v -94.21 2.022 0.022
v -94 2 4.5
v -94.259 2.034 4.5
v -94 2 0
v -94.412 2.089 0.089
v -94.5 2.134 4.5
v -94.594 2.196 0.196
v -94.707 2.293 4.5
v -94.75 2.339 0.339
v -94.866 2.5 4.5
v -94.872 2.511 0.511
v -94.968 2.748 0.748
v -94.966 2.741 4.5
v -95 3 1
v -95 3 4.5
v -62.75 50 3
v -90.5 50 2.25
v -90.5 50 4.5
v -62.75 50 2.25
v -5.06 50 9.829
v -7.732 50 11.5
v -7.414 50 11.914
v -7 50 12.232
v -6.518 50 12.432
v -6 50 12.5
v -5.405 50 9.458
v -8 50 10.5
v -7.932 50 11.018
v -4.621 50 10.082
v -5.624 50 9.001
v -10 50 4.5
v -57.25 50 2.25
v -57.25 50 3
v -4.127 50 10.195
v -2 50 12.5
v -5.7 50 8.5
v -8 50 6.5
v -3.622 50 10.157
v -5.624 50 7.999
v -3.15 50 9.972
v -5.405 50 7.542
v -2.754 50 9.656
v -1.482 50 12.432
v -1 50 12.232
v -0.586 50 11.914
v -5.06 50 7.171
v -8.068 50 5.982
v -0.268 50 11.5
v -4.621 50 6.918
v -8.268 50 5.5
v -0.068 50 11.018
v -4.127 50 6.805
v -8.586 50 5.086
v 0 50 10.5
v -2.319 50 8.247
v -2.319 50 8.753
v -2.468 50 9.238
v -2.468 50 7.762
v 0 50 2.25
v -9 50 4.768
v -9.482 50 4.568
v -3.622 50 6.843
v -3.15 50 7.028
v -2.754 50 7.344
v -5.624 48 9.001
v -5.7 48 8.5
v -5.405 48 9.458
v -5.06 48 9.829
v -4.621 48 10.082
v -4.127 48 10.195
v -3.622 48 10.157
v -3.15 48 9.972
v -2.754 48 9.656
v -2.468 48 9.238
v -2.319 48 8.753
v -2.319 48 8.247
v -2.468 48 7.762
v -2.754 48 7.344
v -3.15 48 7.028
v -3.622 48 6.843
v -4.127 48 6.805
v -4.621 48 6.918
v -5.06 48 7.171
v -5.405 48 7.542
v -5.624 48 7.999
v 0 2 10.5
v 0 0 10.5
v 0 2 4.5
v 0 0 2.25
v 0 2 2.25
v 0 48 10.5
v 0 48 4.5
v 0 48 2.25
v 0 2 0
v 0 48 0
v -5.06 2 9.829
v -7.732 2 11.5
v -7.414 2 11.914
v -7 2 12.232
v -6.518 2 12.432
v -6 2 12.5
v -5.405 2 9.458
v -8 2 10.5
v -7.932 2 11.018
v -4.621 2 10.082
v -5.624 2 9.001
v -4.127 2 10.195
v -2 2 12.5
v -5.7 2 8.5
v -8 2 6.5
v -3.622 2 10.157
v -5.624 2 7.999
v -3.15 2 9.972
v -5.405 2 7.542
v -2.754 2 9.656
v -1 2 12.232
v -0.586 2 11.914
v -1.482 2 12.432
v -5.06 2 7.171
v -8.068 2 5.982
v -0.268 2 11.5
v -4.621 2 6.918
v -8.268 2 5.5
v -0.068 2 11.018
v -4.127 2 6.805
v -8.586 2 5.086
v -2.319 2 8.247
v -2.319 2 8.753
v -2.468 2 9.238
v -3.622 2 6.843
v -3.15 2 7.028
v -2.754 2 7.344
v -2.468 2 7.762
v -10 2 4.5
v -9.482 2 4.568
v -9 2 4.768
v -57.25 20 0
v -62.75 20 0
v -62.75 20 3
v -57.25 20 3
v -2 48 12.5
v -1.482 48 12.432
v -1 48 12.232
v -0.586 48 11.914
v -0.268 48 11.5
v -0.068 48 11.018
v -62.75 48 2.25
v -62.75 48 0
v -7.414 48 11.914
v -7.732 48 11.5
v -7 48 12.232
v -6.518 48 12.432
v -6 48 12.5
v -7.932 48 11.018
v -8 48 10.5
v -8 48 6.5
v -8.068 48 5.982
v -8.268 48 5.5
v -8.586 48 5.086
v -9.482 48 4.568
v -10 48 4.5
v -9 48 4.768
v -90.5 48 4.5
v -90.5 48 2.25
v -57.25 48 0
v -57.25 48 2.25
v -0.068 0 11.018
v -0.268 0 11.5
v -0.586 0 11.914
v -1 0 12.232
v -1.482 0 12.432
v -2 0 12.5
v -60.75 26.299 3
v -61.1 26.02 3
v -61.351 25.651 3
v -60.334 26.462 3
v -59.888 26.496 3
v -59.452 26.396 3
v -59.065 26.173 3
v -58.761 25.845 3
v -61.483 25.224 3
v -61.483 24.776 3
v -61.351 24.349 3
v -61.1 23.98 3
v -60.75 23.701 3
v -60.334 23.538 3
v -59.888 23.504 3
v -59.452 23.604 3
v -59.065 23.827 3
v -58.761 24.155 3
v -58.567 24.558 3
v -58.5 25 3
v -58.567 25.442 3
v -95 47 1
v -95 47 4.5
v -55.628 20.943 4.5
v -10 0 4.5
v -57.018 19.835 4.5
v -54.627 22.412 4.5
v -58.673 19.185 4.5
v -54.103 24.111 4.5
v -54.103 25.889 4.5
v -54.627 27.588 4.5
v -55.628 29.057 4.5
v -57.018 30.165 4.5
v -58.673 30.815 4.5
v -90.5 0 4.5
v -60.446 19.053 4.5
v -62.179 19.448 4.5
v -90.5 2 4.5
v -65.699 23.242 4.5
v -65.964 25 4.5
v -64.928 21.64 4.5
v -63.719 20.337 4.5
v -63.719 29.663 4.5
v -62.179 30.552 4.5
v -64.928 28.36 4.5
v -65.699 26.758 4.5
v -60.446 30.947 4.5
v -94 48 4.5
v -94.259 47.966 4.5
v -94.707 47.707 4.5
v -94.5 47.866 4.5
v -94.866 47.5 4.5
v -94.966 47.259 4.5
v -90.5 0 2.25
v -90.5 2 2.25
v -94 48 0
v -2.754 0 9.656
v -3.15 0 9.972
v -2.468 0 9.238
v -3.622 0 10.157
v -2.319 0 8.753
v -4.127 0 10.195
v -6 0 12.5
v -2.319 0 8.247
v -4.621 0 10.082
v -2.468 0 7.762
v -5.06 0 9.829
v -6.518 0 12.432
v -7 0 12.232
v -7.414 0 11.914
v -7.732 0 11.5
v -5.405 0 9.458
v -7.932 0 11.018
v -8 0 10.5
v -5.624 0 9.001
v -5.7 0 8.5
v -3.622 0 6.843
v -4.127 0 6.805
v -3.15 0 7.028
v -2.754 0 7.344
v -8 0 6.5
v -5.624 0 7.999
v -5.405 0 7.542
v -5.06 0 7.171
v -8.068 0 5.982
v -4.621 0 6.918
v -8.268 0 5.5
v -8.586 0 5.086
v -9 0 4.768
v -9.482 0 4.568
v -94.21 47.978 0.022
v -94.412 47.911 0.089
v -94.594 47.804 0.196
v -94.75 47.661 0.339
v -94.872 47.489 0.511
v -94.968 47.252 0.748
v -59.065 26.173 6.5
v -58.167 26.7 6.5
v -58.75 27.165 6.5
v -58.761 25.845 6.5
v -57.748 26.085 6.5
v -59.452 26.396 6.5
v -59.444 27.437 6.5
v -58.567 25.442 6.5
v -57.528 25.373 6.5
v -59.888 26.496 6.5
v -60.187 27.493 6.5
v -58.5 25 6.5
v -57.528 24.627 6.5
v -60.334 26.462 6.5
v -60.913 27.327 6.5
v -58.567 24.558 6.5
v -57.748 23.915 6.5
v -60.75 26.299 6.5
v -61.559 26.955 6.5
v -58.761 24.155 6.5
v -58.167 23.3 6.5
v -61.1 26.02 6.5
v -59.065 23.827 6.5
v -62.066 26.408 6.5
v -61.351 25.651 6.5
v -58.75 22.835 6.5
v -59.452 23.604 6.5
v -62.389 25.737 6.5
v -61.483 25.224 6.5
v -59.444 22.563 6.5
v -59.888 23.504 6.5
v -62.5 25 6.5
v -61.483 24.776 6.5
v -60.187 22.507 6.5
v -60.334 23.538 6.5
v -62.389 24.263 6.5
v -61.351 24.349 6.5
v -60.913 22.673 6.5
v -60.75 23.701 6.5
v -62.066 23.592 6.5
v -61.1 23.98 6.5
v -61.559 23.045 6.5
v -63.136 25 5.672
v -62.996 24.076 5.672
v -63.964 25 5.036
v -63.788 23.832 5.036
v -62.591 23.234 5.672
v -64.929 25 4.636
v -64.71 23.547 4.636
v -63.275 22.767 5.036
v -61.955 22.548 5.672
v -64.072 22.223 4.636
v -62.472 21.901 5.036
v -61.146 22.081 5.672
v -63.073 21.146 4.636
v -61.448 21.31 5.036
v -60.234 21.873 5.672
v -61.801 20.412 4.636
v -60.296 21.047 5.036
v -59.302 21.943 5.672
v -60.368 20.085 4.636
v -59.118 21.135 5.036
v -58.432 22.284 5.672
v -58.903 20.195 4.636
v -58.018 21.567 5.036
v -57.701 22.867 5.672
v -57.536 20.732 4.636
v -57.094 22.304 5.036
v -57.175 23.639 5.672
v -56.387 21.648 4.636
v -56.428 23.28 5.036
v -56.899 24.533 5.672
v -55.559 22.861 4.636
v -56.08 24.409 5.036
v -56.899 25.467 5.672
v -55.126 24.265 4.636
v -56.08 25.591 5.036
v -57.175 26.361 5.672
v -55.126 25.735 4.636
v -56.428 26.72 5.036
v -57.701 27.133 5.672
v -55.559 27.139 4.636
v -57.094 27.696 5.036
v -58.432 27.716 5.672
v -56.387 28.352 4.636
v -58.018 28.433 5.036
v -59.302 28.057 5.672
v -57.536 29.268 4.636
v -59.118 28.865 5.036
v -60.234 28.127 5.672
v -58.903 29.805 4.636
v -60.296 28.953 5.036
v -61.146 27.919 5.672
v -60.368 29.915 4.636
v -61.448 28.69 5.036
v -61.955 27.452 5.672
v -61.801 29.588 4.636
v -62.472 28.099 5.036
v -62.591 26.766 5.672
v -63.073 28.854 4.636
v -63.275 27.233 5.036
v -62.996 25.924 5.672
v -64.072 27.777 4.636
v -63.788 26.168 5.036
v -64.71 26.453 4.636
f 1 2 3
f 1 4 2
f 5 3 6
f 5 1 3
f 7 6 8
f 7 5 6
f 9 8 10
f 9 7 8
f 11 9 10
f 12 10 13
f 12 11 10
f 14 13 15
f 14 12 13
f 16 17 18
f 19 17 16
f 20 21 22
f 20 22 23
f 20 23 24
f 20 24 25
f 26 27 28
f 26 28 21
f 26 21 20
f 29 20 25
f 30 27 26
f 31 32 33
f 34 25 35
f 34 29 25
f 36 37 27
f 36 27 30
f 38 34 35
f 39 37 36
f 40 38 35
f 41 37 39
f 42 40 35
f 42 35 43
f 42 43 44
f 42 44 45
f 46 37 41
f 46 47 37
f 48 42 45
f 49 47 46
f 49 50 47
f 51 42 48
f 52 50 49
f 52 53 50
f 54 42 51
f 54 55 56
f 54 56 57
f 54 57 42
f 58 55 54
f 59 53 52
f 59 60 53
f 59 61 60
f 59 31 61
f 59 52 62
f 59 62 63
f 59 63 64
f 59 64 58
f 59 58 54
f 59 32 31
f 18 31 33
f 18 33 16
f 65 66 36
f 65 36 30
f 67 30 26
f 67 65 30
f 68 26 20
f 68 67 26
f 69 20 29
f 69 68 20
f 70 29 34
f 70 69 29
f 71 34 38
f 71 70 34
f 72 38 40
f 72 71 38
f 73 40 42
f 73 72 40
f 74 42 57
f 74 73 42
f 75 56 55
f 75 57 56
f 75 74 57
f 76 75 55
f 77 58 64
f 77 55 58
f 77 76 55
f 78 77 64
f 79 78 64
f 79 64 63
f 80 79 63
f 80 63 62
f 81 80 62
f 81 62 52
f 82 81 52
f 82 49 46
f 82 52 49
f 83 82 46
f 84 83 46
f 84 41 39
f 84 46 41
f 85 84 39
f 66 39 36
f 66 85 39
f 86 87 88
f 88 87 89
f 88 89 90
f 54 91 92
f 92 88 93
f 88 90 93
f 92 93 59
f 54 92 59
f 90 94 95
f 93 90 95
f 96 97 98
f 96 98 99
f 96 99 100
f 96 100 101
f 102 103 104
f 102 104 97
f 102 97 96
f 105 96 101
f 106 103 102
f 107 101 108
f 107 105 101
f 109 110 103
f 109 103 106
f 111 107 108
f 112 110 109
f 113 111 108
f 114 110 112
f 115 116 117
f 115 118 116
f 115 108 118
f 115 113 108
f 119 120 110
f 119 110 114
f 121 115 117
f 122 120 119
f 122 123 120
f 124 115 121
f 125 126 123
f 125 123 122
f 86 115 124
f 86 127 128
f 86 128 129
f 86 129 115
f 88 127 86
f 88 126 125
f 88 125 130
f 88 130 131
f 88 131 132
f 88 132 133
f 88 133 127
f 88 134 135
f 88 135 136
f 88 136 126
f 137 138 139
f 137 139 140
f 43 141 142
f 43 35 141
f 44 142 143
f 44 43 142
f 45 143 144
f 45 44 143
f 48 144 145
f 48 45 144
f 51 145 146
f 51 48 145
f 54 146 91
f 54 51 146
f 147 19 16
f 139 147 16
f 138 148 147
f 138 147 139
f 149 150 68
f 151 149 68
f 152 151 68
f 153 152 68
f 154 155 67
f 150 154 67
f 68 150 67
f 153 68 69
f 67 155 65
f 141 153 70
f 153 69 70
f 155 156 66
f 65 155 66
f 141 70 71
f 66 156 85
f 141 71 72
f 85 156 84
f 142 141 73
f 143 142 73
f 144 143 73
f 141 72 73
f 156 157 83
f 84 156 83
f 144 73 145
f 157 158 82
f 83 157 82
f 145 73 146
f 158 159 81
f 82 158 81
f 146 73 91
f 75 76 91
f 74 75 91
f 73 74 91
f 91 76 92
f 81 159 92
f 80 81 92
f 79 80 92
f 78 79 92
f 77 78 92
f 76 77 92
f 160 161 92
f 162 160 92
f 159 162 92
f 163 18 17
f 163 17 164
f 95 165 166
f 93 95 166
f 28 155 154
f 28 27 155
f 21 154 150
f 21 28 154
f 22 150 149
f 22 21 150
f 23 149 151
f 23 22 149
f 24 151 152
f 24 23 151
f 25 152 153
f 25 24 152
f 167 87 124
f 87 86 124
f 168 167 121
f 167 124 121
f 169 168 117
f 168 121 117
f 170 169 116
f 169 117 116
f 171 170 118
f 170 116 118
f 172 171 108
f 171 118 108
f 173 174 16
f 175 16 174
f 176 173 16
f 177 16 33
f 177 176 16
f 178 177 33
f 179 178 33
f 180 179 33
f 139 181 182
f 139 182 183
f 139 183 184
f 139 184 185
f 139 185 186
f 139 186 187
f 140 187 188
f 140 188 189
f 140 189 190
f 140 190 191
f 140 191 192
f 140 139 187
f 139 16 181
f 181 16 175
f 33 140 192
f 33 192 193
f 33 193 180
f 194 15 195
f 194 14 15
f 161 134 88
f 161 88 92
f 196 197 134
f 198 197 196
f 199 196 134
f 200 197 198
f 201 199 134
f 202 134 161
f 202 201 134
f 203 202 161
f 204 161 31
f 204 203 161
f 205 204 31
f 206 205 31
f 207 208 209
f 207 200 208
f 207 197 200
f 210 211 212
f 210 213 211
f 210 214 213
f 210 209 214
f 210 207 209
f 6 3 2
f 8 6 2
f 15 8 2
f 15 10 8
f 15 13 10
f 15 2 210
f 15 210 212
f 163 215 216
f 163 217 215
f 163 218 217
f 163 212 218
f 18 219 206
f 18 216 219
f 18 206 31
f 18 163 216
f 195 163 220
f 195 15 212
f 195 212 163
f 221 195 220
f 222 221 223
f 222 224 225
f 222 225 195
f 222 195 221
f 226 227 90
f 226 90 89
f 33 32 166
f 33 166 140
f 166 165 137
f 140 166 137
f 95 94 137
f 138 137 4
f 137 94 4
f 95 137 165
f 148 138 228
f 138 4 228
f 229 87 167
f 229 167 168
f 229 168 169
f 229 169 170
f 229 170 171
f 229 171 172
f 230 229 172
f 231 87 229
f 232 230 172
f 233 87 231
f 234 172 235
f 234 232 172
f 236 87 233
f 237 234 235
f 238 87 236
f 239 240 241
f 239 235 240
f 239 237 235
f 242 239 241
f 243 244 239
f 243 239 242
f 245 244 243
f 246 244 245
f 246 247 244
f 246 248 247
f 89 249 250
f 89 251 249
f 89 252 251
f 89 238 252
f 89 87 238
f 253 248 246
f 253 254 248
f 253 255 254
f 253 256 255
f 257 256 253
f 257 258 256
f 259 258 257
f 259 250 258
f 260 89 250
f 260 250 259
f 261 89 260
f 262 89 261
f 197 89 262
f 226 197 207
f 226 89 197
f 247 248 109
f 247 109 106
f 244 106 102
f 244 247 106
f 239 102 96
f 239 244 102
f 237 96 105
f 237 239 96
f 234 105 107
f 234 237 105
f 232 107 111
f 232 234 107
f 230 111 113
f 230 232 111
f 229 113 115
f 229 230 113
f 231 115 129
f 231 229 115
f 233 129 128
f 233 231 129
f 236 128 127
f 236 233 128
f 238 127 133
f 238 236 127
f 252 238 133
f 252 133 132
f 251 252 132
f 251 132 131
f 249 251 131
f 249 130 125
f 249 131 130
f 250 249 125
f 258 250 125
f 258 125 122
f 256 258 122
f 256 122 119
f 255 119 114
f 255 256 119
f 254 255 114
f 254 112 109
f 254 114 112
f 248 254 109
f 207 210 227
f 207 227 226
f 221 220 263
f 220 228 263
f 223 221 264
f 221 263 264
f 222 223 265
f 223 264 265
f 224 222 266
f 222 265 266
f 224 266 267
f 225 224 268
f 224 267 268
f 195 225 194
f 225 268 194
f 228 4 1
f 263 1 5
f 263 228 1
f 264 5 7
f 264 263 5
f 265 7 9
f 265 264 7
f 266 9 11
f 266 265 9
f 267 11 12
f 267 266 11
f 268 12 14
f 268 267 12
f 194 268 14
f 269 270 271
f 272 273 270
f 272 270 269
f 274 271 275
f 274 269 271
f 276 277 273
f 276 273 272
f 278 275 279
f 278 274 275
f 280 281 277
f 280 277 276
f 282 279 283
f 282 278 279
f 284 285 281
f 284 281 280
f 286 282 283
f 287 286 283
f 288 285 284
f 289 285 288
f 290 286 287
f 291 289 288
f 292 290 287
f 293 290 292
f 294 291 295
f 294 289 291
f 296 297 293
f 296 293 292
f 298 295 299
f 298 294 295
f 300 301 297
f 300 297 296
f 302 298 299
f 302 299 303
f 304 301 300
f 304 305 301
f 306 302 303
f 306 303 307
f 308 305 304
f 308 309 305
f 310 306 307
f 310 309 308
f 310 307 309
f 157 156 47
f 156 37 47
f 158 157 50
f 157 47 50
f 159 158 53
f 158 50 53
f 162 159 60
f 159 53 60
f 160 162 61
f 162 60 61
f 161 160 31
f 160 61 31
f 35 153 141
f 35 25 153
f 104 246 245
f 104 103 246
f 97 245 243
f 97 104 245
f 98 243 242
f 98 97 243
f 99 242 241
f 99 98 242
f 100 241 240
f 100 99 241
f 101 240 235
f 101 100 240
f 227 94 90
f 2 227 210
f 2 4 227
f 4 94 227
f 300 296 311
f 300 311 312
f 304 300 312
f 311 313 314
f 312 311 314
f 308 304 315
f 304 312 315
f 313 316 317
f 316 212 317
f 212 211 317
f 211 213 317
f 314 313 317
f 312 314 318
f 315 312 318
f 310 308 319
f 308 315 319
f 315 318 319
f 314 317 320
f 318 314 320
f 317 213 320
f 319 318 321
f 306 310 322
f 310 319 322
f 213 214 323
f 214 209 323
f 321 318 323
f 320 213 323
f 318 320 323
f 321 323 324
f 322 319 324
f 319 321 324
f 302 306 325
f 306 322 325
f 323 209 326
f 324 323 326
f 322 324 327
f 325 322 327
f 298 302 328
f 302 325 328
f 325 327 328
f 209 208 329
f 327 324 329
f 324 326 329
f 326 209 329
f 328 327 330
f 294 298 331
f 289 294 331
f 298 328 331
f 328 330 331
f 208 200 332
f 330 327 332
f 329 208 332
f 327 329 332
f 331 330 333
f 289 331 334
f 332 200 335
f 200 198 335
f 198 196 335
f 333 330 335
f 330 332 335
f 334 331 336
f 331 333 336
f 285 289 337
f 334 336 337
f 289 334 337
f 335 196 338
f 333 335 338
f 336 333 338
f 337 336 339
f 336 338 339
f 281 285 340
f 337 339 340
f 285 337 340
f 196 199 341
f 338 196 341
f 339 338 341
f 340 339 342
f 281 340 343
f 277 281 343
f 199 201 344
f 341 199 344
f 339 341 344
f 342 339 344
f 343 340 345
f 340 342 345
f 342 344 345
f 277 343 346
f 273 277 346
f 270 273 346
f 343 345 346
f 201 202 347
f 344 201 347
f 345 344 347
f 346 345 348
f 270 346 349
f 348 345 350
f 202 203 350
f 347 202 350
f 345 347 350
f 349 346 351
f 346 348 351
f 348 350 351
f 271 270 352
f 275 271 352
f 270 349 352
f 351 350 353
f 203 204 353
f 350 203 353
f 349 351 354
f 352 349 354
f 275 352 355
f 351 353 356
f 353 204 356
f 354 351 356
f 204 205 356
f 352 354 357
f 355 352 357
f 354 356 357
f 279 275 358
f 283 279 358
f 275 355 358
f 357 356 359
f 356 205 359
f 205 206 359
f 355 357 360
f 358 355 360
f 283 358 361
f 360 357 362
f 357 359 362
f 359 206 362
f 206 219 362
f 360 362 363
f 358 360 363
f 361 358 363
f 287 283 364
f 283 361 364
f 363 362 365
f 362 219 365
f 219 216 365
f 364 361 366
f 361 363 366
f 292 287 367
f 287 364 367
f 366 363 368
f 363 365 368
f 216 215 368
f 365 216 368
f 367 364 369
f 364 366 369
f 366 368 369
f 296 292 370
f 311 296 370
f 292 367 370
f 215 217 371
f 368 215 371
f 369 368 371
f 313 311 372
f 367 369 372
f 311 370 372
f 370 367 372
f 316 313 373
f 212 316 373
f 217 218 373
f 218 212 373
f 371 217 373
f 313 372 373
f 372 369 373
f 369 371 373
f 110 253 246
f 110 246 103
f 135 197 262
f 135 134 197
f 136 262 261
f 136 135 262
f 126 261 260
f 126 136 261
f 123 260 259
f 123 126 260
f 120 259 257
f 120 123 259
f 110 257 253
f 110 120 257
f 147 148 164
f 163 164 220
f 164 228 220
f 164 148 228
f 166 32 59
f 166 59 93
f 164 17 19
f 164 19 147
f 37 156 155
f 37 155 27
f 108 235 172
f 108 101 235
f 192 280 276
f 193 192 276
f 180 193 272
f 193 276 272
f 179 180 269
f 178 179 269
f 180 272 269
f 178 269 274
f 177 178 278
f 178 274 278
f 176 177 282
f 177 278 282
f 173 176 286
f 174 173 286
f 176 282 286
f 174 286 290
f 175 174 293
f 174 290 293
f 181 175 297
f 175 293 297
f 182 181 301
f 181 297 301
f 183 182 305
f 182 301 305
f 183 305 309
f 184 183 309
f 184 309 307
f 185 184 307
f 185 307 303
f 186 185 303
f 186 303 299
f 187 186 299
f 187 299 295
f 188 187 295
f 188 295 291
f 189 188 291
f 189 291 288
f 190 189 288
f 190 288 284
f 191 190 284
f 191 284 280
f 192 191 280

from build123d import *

# Parameters (mm, degrees)
SKETCH1_W               = 50
SKETCH1_H               = 95
BOSS_EXTRUDE1_DEPTH     = 4.5
SKETCH2_R               = 0.5
CUT_EXTRUDE1_DEPTH      = 108.448825028
SKETCH3_W               = 2
SKETCH3_H               = 2.25
CUT_EXTRUDE2_DEPTH      = 108.448825028
SKETCH5_R               = 2.5
BOSS_EXTRUDE2_DEPTH     = 2
SKETCH6_R               = 1.5
CUT_EXTRUDE3_DEPTH      = 108.551150621
FILLET1_R               = 4
SKETCH8_W               = 5.5
SKETCH8_H               = 30
CUT_EXTRUDE4_DEPTH      = 3
SKETCH10_W              = 2
SKETCH10_H              = 2.25
CUT_EXTRUDE5_DEPTH      = 4.5
FILLET2_R               = 1
SKETCH11_W              = 8
SKETCH11_H              = 2
BOSS_EXTRUDE3_DEPTH     = 8
CUT_EXTRUDE6_DEPTH      = 109.079831606
CUT_EXTRUDE6_DEPTH_BACK = 109.079831606
SKETCH12_R              = 1.7
FILLET3_R               = 2


with BuildPart() as part:
    # Sketch1 → Boss-Extrude1 (new body)
    with BuildSketch(Plane(origin=(0, 0, 0), x_dir=(0, 1, 0), z_dir=(0, 0, 1))):
        with Locations((25, 47.5)):
            Rectangle(SKETCH1_W, SKETCH1_H)
    extrude(amount=BOSS_EXTRUDE1_DEPTH)

    # Sketch2 → Cut-Extrude1 (cut, through all)
    with BuildSketch(Plane.XY.offset(4.5)):
        with Locations((-60, 25)):
            Circle(SKETCH2_R)
    extrude(amount=-CUT_EXTRUDE1_DEPTH, mode=Mode.SUBTRACT)

    # Sketch3 → Cut-Extrude2 (cut, through all)
    with BuildSketch(Plane(origin=(-95, 0, 0), x_dir=(0, -1, 0), z_dir=(-1, 0, 0))):
        with Locations((-49, 1.125)):
            Rectangle(SKETCH3_W, SKETCH3_H)
        with Locations((-1, 1.125)):
            Rectangle(SKETCH3_W, SKETCH3_H)
    extrude(amount=-CUT_EXTRUDE2_DEPTH, mode=Mode.SUBTRACT)

    # Sketch5 → Boss-Extrude2 (add)
    with BuildSketch(Plane.XY.offset(4.5)):
        with Locations(Location((-60, 25, 0), (0, 0, 180))):
            Circle(SKETCH5_R)
    extrude(amount=BOSS_EXTRUDE2_DEPTH)

    # Sketch6 → Cut-Extrude3 (cut, through all)
    with BuildSketch(Plane.XY.offset(6.5)):
        with Locations((-60, 25)):
            Circle(SKETCH6_R)
    extrude(amount=-CUT_EXTRUDE3_DEPTH, mode=Mode.SUBTRACT)

    # Fillet1
    # the kernel refuses this fillet: 4 mm, written as the material it adds along each edge
    with BuildSketch(Plane(origin=(-60, 25, 4.5), x_dir=(-1, 0, 0), z_dir=(0, 1, 0))) as fillet1_piece_1:
        with BuildLine():
            CenterArc((5.964101615, 4), FILLET1_R, 210, 60)
            Line((2.5, 2), (2.430717968, 1.96))
            ThreePointArc((2.430717968, 1.96), (2.42, 1), (2.42, 0))
            Line((2.42, 0), (2.5, -0.08))
            Line((2.5, -0.08), (5.964101615, -0.08))
            Line((5.964101615, -0.08), (5.964101615, 0))
        make_face()
    revolve(axis=Axis((-60, 25, 4.5), (0, 0, 1)))

    # Sketch8 → Cut-Extrude4 (cut)
    with BuildSketch(Plane(origin=(0, 0, 0), x_dir=(1, 0, 0), z_dir=(0, 0, -1))):
        with Locations((-60, -35)):
            Rectangle(SKETCH8_W, SKETCH8_H)
    extrude(amount=-CUT_EXTRUDE4_DEPTH, mode=Mode.SUBTRACT)

    # Sketch10 → Cut-Extrude5 (cut)
    with BuildSketch(Plane(origin=(-95, 0, 0), x_dir=(0, -1, 0), z_dir=(-1, 0, 0))):
        with Locations((-49, 3.375)):
            Rectangle(SKETCH10_W, SKETCH10_H)
        with Locations((-1, 3.375)):
            Rectangle(SKETCH10_W, SKETCH10_H)
    extrude(amount=-CUT_EXTRUDE5_DEPTH, mode=Mode.SUBTRACT)

    # Fillet2
    fillet2_edges = [part.edges().sort_by_distance(p)[0] for p in [
        (-95, 25, 0),
        (-95, 48, 2.25),
        (-95, 2, 2.25),
    ]]
    fillet(fillet2_edges, radius=FILLET2_R)

    # Sketch11 → Boss-Extrude3 (add)
    with BuildSketch(Plane.XY.offset(4.5)):
        with Locations((-4, 49)):
            Rectangle(SKETCH11_W, SKETCH11_H)
        with Locations((-4, 1)):
            Rectangle(SKETCH11_W, SKETCH11_H)
    extrude(amount=BOSS_EXTRUDE3_DEPTH)

    # Sketch12 → Cut-Extrude6 (cut, two sides: drawn at the far end of the back side and taken through both)
    with BuildSketch(Plane(origin=(0, 50, 0), x_dir=(-1, 0, 0), z_dir=(0, 1, 0)).offset(-CUT_EXTRUDE6_DEPTH_BACK)):
        with Locations((4, 8.5)):
            Circle(SKETCH12_R)
    extrude(amount=CUT_EXTRUDE6_DEPTH + CUT_EXTRUDE6_DEPTH_BACK, mode=Mode.SUBTRACT)

    # Fillet3
    fillet3_edges = [part.edges().sort_by_distance(p)[0] for p in [
        (-8, 49, 4.5),
        (0, 49, 12.5),
        (-8, 49, 12.5),
        (-8, 1, 4.5),
        (0, 1, 12.5),
        (-8, 1, 12.5),
    ]]
    fillet(fillet3_edges, radius=FILLET3_R)


solid = part.part
